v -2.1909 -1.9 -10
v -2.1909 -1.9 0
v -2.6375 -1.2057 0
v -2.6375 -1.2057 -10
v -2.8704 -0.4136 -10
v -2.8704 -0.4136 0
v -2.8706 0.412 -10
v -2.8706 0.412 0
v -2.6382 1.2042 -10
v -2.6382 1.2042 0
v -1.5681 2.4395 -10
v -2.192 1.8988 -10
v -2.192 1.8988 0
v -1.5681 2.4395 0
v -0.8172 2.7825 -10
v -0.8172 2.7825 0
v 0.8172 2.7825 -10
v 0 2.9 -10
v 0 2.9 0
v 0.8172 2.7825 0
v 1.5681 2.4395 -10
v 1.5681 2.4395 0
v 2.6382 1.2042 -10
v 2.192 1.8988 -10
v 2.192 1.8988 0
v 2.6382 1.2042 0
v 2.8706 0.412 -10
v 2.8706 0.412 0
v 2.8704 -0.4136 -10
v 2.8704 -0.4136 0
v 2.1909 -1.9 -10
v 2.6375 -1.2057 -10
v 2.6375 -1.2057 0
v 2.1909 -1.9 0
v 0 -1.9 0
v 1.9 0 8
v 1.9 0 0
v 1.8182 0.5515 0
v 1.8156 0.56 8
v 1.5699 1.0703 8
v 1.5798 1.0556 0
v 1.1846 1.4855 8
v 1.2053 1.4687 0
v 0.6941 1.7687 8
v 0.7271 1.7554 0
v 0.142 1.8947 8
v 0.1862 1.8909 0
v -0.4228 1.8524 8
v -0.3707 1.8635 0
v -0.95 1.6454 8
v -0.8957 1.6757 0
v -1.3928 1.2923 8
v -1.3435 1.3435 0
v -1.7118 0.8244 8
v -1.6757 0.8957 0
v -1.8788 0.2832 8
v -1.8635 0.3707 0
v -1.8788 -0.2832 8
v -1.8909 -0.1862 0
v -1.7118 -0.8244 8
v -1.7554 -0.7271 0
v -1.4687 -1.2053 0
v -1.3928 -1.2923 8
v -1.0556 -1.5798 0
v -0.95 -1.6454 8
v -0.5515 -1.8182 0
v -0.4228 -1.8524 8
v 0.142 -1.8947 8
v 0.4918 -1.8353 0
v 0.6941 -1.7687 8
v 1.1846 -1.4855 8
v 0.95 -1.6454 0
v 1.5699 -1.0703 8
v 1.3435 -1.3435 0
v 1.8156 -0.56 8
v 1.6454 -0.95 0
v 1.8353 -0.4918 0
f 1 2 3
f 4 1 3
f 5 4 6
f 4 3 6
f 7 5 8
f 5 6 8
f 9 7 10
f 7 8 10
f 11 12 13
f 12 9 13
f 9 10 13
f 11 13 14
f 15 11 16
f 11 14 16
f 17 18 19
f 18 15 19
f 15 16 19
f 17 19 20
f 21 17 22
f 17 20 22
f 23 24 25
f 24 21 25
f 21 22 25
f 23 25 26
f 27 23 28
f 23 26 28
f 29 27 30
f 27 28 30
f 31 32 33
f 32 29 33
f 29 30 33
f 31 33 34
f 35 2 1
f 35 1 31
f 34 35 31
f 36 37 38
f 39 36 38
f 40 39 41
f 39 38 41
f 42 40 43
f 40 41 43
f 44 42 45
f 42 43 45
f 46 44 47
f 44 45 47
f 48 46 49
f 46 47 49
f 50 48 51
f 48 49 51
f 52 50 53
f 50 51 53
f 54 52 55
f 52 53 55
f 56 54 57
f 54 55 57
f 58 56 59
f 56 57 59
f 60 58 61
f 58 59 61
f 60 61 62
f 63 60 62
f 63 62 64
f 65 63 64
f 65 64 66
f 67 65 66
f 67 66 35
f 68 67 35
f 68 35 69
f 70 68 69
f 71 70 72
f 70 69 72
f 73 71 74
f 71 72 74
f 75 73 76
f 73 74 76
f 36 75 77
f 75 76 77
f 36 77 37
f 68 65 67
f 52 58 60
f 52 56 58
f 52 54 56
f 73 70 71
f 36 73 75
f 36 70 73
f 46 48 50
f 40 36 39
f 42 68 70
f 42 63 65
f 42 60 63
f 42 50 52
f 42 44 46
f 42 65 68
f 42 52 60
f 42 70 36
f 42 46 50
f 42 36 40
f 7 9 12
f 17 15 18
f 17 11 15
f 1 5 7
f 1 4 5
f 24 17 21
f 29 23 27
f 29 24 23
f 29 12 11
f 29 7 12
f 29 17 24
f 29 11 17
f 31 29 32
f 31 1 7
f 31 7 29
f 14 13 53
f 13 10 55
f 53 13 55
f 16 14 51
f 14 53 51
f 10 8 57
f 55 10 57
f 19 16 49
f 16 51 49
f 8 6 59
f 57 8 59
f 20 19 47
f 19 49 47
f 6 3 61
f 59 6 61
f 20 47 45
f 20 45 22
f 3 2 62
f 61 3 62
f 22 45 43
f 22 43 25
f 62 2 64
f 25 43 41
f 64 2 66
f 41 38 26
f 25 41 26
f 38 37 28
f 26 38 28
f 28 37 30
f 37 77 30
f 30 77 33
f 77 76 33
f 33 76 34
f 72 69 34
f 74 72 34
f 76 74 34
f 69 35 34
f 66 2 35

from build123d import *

# Parameters (mm, degrees)
F0_R     = 1.9
F1_DEPTH = 8
F2_R     = 2.9
F3_DEPTH = 10
F5_W     = 18.789151
F5_H     = 32.01971
F6_DEPTH = 25


with BuildPart() as f1:
    # F0 (on Top) → F1 (new body)
    with BuildSketch(Plane.XY):
        Circle(F0_R)
    extrude(amount=F1_DEPTH)

    # F2 (on face) → F3 (join)
    with BuildSketch(Plane(origin=(0, 0, 0), x_dir=(1, 0, 0), z_dir=(0, 0, -1))):
        Circle(F2_R)
    extrude(amount=F3_DEPTH)

    # F5 (on offset) → F6 (cut)
    with BuildSketch(Plane.XZ.offset(1.9)):
        with Locations((0.467039, -0.190436)):
            Rectangle(F5_W, F5_H)
    extrude(amount=F6_DEPTH, mode=Mode.SUBTRACT)


solid = f1.part
